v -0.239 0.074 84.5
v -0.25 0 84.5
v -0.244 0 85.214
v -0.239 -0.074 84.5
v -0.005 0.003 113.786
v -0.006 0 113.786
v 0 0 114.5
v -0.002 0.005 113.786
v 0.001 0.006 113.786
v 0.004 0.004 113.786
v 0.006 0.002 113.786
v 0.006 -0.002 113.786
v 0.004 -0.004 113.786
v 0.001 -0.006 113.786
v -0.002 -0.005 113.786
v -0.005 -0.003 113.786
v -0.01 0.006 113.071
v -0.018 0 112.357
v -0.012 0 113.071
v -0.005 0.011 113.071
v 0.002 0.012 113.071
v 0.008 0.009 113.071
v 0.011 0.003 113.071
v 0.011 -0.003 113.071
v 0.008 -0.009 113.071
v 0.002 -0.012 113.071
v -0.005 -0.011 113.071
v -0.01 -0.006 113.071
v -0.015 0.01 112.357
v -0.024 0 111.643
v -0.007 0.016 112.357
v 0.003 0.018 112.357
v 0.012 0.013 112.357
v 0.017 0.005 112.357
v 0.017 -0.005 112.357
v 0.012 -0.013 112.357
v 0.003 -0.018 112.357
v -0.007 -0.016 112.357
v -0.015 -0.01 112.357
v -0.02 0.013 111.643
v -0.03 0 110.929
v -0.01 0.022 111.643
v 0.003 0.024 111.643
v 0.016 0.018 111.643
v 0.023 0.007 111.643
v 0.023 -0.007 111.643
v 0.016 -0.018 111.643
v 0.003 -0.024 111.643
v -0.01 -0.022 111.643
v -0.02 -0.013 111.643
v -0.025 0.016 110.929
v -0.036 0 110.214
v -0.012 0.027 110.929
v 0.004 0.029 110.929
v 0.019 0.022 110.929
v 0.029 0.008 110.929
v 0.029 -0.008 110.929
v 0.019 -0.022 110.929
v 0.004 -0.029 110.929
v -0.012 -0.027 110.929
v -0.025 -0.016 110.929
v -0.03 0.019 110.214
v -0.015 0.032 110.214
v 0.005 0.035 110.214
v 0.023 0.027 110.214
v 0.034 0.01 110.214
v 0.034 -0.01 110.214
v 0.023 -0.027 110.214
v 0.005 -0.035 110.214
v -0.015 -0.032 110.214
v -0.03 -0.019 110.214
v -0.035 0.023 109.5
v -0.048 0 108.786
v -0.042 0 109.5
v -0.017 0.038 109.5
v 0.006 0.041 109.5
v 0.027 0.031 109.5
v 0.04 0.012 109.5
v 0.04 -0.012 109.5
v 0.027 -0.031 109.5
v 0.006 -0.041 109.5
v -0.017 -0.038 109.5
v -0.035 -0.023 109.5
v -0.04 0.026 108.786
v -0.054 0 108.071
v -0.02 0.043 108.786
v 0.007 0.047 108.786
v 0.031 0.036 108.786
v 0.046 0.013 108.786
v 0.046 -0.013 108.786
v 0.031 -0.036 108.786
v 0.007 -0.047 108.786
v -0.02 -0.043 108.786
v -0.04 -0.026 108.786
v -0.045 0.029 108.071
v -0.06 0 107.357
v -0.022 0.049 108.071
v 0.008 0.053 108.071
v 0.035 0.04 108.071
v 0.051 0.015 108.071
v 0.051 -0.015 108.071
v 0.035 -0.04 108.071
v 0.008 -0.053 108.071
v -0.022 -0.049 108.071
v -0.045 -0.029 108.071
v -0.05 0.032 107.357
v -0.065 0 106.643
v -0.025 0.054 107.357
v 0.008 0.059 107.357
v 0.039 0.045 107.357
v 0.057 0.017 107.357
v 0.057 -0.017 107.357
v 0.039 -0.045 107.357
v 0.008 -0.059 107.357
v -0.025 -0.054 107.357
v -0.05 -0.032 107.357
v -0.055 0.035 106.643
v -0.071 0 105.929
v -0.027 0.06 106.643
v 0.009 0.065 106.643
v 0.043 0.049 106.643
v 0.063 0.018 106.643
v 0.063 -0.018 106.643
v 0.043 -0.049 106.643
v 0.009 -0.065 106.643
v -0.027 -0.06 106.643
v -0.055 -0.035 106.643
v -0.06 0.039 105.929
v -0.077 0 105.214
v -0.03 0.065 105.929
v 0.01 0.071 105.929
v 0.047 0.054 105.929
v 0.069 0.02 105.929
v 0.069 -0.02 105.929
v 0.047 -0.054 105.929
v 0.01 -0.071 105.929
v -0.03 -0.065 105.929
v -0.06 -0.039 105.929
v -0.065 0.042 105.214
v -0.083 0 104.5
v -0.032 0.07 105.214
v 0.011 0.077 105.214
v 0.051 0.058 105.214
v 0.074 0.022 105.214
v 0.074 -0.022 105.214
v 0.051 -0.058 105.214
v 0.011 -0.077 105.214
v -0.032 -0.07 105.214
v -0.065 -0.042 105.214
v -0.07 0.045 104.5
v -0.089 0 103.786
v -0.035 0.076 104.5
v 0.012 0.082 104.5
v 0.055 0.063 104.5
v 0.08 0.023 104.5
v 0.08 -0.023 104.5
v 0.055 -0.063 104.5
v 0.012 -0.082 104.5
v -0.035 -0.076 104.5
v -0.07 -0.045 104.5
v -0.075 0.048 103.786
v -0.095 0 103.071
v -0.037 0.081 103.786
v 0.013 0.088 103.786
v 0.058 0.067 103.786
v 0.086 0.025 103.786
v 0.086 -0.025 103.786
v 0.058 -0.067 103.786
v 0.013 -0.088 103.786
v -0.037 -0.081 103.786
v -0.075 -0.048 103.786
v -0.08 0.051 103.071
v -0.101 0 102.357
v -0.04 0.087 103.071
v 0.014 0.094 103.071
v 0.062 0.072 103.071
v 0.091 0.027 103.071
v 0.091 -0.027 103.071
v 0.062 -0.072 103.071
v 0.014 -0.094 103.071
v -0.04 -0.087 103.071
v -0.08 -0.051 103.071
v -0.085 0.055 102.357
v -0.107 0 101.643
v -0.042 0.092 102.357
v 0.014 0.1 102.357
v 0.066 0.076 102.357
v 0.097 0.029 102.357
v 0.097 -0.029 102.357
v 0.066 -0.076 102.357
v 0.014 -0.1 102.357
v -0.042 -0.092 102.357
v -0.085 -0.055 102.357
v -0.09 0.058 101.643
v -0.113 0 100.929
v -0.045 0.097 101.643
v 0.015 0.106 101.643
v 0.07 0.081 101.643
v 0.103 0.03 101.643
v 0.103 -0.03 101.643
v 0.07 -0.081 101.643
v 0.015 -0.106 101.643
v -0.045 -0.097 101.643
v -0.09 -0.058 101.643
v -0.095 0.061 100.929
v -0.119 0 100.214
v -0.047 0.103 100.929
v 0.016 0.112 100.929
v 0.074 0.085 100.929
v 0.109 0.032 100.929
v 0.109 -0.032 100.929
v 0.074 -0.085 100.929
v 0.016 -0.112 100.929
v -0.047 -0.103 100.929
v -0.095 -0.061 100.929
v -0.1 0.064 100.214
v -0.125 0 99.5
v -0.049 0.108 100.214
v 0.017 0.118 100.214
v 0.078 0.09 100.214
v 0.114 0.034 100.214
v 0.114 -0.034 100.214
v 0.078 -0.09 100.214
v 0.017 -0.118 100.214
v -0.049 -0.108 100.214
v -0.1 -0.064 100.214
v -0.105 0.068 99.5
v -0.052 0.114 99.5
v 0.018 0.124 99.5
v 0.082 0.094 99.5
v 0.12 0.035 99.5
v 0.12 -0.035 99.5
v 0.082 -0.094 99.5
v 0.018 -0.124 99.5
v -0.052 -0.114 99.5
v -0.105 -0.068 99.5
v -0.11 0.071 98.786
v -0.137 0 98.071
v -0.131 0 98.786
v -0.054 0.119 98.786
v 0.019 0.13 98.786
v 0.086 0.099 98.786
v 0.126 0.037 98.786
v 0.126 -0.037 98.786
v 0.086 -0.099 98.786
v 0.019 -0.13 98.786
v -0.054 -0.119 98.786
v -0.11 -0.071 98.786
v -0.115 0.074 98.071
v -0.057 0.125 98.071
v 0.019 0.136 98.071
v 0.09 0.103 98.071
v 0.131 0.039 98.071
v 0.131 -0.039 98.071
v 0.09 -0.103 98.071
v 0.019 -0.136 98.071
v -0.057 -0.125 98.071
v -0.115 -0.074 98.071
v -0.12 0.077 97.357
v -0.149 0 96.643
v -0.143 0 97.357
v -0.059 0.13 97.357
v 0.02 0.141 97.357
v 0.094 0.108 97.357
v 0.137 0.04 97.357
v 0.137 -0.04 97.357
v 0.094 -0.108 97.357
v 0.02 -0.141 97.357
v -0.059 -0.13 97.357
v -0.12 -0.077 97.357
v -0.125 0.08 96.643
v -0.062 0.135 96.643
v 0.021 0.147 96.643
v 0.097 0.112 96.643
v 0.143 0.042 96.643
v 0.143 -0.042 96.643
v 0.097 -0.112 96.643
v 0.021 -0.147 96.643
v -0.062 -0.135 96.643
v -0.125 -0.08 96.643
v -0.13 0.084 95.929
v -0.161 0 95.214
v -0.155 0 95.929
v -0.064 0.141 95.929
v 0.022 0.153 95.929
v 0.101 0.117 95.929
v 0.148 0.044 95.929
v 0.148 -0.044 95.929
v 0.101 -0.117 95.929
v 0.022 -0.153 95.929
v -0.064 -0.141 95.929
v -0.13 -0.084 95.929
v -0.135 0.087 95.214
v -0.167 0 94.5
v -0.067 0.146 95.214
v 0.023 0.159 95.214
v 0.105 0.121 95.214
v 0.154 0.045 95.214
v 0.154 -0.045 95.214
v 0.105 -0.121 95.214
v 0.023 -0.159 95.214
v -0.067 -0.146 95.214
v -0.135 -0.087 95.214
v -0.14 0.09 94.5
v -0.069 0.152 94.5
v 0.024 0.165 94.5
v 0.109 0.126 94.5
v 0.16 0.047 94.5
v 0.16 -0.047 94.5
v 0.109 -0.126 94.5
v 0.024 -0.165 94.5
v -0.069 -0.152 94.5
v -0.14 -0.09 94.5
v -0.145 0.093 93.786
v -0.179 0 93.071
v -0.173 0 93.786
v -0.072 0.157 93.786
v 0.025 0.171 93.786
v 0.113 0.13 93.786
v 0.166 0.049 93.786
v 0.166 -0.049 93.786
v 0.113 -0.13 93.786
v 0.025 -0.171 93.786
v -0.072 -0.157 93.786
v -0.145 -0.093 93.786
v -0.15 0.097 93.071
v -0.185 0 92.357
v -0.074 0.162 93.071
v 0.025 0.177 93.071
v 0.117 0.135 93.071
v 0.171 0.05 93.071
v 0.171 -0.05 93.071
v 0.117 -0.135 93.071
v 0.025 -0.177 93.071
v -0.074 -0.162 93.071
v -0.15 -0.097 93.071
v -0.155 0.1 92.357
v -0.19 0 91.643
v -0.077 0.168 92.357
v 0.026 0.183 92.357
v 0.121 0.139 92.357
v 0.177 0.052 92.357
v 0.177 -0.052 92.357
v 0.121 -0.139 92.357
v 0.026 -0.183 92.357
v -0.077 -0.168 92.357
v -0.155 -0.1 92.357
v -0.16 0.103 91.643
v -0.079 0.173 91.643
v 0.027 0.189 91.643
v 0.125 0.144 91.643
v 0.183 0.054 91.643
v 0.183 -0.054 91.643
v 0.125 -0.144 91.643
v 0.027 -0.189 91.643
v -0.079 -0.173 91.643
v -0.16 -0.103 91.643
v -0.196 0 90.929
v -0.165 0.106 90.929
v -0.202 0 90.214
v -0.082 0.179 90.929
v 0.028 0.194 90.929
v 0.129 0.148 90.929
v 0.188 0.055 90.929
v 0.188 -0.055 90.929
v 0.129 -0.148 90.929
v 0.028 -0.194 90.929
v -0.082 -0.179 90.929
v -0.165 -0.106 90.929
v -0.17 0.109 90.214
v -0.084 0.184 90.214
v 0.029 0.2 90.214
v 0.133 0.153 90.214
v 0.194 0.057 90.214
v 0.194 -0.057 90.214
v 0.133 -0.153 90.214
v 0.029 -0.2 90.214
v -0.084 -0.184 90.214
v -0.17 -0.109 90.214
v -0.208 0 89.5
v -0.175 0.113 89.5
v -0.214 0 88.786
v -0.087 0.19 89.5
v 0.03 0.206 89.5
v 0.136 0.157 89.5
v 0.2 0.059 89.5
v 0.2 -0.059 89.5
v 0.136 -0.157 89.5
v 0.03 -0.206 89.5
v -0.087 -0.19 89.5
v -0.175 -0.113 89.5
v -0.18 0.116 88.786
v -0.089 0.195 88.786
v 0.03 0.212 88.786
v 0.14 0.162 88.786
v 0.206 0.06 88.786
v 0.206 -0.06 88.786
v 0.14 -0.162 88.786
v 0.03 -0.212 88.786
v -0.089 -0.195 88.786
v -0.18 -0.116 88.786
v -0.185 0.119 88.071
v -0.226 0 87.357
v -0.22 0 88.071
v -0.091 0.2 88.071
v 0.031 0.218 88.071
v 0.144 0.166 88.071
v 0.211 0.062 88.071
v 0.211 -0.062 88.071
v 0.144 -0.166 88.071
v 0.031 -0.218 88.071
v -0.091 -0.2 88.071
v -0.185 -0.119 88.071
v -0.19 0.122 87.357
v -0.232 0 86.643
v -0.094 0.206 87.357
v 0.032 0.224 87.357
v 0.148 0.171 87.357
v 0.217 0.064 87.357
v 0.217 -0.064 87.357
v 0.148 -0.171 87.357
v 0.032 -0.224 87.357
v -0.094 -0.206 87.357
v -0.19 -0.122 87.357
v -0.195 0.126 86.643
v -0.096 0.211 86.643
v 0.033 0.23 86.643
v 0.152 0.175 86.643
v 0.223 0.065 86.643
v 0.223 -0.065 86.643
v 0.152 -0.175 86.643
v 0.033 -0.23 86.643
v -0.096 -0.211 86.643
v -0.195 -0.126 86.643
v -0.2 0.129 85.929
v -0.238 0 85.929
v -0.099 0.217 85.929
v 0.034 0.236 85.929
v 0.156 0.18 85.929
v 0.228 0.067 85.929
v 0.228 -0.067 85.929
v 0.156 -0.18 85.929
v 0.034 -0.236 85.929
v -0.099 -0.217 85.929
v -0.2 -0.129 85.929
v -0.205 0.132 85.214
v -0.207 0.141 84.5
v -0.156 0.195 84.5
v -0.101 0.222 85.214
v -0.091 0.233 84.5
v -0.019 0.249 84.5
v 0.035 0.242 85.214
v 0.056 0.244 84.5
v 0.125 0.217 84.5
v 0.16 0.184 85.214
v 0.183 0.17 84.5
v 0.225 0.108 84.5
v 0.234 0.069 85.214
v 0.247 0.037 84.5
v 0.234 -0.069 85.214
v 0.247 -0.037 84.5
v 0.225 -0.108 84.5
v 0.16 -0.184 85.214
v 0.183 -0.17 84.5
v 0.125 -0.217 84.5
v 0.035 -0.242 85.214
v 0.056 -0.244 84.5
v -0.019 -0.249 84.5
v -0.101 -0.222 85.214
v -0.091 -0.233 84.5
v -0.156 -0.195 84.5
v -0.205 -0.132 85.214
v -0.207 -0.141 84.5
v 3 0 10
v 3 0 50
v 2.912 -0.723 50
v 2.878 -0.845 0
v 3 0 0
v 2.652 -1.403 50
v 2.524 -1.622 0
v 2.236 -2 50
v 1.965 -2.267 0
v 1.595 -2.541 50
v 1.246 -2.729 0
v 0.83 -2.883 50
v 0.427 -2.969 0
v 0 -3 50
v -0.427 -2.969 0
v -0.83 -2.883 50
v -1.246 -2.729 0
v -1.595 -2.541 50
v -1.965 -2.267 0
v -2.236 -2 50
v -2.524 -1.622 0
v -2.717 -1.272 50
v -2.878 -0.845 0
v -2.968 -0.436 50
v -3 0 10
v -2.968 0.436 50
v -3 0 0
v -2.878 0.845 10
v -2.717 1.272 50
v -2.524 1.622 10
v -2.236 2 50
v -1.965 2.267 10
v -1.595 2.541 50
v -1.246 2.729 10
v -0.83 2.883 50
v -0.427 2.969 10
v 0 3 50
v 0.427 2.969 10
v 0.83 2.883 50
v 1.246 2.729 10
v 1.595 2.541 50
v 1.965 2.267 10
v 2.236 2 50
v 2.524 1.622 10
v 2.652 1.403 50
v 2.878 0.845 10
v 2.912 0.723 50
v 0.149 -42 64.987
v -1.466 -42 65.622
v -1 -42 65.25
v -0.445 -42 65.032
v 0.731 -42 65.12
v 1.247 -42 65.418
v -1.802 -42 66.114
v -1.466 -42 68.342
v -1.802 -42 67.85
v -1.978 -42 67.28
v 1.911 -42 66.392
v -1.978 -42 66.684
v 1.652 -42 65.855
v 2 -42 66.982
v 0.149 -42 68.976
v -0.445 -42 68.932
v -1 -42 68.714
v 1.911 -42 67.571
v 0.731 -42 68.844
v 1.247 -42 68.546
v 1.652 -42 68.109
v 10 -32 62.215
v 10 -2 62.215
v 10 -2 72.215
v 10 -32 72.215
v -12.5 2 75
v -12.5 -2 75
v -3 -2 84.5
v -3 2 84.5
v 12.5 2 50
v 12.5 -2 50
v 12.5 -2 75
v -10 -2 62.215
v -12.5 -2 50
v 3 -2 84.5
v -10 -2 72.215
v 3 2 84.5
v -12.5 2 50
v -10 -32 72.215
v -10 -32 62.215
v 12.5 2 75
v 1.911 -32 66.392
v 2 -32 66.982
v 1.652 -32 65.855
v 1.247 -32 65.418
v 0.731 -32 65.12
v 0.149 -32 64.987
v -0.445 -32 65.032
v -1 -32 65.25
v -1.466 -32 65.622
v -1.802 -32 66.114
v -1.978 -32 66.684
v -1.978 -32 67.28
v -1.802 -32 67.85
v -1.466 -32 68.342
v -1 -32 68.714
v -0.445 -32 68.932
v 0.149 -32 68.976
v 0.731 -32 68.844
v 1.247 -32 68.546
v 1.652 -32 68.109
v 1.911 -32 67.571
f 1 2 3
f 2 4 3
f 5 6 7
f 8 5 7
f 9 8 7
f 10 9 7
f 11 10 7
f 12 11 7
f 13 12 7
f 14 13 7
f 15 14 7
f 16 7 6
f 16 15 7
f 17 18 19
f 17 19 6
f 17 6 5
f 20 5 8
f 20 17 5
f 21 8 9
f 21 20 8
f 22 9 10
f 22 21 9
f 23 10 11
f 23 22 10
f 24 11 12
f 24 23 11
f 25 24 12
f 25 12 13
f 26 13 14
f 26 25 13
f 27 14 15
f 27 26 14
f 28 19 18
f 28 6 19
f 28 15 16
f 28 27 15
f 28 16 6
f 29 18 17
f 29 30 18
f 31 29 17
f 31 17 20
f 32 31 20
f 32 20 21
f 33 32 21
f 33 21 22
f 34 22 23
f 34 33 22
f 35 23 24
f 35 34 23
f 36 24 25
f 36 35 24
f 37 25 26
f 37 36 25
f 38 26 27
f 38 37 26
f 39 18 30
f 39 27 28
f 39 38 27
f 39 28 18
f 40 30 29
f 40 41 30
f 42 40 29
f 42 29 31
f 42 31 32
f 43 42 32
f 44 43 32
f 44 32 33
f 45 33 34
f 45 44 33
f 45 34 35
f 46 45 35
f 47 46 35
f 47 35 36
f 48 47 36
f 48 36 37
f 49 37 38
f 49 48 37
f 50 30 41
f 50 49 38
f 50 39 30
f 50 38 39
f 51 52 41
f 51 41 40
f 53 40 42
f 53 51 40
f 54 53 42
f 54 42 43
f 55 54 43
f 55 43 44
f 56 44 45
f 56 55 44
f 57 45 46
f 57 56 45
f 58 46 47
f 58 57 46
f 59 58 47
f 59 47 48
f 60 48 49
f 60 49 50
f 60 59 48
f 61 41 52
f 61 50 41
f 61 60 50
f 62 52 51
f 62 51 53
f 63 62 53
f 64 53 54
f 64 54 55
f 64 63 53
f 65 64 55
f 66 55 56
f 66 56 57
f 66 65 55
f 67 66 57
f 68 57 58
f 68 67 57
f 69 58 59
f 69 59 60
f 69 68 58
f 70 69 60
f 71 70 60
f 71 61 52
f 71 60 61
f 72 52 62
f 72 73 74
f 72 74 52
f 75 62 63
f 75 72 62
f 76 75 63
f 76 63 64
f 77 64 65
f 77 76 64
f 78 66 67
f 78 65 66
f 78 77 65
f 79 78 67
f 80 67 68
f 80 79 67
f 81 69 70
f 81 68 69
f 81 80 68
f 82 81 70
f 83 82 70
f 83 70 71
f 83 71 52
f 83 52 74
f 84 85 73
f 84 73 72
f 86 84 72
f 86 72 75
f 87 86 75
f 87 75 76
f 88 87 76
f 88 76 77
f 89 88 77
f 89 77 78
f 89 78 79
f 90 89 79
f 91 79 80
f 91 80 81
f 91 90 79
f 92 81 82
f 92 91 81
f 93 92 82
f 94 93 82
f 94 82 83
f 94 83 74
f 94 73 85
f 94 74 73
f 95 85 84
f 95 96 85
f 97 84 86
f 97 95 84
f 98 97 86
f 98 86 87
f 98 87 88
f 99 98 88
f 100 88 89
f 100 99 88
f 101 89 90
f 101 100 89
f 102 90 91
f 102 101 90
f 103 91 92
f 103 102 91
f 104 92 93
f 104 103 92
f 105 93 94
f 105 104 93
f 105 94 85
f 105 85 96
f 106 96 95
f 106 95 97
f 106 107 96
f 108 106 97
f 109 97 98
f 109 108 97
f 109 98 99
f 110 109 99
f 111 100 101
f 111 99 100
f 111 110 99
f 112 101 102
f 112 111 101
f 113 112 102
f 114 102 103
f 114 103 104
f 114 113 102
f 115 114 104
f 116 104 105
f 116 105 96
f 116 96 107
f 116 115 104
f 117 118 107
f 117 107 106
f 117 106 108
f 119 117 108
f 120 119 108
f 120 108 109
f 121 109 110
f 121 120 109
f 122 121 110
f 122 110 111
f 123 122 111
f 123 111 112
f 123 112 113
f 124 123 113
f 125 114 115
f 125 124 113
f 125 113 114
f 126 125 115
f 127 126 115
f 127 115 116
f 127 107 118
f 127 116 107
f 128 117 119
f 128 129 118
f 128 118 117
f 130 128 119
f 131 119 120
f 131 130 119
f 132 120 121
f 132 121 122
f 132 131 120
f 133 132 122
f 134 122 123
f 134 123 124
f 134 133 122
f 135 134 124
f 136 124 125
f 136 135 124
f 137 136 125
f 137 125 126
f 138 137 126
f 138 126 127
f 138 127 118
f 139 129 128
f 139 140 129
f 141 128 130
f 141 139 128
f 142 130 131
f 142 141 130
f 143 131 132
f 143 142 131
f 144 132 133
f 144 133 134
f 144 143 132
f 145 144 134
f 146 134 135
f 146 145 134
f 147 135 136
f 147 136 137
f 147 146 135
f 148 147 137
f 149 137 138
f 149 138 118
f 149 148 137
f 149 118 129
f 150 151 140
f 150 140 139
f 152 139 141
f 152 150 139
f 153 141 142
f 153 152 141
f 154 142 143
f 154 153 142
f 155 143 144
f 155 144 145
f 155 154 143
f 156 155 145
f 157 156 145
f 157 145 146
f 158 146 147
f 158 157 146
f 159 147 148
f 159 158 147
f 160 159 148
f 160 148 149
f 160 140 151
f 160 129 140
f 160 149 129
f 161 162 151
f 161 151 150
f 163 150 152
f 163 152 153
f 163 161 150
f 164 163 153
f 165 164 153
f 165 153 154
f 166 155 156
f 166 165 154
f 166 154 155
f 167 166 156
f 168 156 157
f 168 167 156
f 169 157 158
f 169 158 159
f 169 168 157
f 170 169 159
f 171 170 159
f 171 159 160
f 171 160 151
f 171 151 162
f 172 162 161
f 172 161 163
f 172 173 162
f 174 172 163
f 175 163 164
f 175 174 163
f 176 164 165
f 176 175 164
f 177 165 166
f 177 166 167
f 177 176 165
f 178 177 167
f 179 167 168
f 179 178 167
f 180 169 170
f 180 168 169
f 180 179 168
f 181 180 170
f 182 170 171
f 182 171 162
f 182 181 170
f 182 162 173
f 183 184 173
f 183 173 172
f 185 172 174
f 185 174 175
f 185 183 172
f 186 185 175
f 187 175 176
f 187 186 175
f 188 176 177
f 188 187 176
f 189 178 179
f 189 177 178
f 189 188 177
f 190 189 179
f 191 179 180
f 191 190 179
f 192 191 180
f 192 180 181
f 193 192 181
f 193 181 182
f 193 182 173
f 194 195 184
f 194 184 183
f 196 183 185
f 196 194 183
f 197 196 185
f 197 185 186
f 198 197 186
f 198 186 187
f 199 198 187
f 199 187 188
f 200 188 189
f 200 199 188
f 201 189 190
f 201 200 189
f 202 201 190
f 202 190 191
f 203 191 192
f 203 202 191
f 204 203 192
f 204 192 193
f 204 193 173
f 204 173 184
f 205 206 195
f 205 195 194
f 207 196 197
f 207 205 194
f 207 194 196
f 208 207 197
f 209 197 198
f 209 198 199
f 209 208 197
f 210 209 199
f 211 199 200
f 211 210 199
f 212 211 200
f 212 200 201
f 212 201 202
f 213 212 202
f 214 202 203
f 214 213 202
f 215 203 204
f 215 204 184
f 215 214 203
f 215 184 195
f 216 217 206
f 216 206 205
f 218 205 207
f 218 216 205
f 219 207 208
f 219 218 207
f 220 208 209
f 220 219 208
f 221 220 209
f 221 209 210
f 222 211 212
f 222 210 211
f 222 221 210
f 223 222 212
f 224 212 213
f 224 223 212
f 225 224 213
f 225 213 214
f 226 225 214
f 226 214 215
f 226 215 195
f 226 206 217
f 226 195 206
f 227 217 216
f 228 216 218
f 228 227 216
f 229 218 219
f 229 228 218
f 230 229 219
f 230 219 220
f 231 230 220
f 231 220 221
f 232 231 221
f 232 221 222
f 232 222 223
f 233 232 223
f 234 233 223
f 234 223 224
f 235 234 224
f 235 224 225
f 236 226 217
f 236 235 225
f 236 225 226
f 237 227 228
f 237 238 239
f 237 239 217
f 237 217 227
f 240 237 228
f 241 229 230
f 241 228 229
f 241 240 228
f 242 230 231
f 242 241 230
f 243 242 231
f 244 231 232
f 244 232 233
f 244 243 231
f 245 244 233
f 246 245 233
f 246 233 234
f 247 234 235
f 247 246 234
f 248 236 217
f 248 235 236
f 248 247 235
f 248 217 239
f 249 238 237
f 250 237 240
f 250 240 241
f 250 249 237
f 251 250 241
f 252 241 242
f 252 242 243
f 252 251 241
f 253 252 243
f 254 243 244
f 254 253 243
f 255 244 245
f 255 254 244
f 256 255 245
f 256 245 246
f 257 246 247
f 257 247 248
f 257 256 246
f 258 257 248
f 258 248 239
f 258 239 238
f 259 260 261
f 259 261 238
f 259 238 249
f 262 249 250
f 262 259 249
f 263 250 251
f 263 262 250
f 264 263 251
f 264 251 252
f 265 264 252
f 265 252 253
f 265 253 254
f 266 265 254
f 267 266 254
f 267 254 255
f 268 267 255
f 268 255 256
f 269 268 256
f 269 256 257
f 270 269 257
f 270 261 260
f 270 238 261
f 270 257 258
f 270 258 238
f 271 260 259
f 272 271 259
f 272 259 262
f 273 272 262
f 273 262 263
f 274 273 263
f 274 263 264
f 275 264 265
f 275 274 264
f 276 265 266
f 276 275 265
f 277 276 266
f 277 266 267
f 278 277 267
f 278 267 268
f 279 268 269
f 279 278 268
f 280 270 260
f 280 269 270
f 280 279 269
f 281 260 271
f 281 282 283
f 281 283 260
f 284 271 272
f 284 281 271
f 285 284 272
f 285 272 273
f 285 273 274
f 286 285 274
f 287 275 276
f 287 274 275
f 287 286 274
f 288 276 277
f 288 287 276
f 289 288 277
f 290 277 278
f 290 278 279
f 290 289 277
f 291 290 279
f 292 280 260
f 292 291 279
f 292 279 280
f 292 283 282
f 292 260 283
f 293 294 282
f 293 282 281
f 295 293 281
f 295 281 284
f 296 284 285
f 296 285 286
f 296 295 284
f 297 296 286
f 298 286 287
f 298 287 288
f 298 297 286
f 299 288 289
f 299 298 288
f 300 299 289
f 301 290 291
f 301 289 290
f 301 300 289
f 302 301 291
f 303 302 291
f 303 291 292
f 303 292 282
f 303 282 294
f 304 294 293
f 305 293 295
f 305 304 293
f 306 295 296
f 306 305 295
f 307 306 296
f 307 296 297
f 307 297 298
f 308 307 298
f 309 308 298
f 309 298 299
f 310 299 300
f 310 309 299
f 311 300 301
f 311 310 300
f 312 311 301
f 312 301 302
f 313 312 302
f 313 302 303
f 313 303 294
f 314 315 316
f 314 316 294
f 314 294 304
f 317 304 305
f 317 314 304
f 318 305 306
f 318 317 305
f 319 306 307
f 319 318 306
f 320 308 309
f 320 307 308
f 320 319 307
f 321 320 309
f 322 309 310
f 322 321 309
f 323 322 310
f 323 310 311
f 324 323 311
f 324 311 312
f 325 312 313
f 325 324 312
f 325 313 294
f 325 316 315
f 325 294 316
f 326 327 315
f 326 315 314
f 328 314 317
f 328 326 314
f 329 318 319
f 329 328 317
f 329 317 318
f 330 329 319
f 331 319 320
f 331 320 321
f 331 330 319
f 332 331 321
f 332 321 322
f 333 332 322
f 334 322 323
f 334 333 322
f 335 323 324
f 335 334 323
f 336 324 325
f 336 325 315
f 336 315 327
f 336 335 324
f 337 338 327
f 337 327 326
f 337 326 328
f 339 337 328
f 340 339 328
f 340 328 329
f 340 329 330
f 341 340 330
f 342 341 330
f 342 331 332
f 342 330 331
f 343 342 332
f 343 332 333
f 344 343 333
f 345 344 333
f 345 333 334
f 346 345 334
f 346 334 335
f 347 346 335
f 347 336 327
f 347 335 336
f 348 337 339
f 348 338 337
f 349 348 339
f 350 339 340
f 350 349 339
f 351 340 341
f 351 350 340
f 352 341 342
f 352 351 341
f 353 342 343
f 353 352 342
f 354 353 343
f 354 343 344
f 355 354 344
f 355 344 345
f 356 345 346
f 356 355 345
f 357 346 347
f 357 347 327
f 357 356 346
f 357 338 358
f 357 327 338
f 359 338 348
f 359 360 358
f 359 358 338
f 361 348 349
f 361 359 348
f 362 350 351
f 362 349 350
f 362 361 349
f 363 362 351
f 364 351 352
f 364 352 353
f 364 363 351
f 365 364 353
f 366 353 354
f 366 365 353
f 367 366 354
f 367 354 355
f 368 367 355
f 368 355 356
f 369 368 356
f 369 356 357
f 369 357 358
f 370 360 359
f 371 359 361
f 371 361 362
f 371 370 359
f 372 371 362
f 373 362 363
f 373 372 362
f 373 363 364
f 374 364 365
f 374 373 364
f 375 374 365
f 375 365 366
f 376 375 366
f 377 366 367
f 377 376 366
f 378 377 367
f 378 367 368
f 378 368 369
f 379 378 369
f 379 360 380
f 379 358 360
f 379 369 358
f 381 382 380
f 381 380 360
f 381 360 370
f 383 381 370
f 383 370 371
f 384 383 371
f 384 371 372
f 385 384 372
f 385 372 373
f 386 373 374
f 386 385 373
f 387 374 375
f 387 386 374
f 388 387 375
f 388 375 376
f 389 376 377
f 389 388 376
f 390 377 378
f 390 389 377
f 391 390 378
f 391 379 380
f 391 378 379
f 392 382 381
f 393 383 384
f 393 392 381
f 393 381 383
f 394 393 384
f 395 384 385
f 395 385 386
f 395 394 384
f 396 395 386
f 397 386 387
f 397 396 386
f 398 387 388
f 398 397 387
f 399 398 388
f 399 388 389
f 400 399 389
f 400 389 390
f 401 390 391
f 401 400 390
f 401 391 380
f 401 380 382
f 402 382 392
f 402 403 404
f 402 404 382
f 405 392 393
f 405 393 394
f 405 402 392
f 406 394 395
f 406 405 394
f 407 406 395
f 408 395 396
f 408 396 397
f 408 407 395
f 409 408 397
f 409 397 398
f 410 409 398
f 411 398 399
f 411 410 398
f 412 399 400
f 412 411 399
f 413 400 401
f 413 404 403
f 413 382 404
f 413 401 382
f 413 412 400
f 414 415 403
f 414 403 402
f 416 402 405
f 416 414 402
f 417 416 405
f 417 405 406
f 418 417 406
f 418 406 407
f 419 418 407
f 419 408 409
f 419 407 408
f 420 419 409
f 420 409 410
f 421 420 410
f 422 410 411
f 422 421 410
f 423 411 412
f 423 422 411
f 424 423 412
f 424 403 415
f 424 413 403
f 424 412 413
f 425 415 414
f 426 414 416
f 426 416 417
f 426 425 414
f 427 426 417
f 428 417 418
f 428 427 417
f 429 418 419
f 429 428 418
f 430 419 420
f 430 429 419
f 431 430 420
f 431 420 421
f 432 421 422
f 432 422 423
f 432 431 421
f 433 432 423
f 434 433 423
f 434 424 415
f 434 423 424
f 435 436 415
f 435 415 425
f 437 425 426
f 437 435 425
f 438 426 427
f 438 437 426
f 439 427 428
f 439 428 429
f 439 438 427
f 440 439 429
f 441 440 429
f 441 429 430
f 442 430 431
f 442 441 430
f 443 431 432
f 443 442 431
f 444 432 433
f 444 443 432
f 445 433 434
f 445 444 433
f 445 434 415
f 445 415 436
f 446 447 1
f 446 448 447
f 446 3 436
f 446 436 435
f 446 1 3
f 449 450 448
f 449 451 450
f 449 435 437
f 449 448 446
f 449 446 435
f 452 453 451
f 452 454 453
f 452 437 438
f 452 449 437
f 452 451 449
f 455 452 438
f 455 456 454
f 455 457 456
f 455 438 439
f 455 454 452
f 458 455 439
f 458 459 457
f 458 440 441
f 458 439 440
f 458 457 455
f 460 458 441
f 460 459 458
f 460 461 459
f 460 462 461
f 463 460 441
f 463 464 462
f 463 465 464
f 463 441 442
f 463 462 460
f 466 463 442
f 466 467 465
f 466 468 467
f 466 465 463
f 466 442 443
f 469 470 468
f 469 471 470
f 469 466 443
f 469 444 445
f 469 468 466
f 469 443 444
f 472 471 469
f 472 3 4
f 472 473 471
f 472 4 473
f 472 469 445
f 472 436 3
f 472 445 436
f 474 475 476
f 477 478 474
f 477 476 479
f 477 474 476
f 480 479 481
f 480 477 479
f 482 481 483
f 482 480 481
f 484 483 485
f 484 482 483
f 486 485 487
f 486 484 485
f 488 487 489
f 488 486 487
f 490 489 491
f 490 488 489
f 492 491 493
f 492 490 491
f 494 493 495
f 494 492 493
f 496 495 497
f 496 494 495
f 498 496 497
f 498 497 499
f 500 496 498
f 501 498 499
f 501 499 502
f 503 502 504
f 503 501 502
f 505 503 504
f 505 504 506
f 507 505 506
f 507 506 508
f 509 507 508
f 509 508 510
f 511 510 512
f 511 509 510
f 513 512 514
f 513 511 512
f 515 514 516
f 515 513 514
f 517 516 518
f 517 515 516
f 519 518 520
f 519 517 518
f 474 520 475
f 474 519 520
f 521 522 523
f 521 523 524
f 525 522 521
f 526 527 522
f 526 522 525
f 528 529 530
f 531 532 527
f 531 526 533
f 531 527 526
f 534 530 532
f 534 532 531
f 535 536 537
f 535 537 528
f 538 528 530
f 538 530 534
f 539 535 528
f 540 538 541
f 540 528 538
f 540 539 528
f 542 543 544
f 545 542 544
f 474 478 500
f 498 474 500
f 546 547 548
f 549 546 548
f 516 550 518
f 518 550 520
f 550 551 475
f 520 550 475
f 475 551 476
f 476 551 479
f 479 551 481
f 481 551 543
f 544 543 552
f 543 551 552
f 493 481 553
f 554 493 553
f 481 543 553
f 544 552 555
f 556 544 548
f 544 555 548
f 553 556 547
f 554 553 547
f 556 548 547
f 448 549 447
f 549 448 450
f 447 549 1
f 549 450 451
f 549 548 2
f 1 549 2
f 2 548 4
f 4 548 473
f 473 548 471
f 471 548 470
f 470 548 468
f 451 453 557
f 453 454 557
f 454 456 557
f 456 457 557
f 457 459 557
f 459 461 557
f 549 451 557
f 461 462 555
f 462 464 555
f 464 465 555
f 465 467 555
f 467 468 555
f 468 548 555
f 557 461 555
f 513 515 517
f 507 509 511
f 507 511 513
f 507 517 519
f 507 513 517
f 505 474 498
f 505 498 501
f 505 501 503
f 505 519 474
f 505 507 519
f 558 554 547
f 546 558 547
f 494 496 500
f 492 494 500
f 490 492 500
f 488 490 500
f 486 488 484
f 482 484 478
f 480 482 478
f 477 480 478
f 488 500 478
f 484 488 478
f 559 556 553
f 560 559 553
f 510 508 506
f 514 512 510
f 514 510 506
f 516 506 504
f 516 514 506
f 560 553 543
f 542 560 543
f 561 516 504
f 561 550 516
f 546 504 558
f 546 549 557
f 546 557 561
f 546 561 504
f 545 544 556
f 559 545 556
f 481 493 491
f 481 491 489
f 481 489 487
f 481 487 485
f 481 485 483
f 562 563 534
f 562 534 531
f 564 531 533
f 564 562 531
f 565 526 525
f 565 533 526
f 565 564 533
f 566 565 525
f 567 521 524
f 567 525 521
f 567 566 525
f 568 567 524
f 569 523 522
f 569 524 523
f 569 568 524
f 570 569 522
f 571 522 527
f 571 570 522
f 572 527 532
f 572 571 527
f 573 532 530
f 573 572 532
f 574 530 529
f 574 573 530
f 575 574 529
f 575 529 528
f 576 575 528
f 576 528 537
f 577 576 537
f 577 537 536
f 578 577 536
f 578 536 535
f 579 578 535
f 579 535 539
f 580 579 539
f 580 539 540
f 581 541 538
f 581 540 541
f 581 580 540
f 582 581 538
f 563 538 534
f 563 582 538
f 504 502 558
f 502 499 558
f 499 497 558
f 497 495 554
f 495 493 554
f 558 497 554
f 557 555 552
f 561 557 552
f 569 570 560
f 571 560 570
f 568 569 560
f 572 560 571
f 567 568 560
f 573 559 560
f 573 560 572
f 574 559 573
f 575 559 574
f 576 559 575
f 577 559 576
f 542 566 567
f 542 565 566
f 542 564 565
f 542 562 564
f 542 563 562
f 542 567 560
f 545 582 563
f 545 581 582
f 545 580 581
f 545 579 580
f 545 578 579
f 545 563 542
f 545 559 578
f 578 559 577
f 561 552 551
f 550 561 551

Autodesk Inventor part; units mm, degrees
ref_plane "YZ Plane" through (0, 0, 0) normal (1, 0, 0) x (0, 1, 0)
ref_plane "XZ Plane" through (0, 0, 0) normal (0, 1, 0) x (-1, 0, 0)
ref_plane "XY Plane" through (0, 0, 0) normal (0, 0, 1) x (1, 0, 0)
sketch "Sketch1" plane through (0, 0, 0) normal (0, 0, 1) x (1, 0, 0)
  circle A0 centre (0, 0) radius 3
  dimension "d0" = 6
extrude "Extrusion1" add sketch "Sketch1" along normal blind 50
sketch "Sketch2" plane through (0, 0, 0) normal (0, 1, 0) x (-1, 0, 0)
  line L0 (-12.5, 75) -> (-12.5, 50)
  line L1 (-12.5, 50) -> (12.5, 50)
  line L2 (12.5, 50) -> (12.5, 75)
  line L3 (12.5, 75) -> (-12.5, 75)
  line L4 (-12.5, 75) -> (12.5, 50) construction
  line L5 (-12.5, 50) -> (12.5, 75) construction
  line L6 (3, 50) -> (-3, 50) projected
  line L7 (3, 50) -> (-3, 50) projected
  line L8 (3, 0) -> (-3, 0) projected
  line L9 (3, 0) -> (-3, 0) projected
  line L10 (-3, 0) -> (3, 50)
  line L11 (3, 0) -> (-3, 50)
  line L12 (12.5, 75) -> (3, 84.5)
  line L13 (3, 84.5) -> (3, 84.5)
  line L14 (3, 84.5) -> (-3, 84.5)
  line L15 (-3, 84.5) -> (-3, 84.5)
  line L16 (-3, 84.5) -> (-12.5, 75)
  line L17 (0.25, 84.5) -> (0, 114.5)
  line L18 (0, 114.5) -> (-0.25, 84.5)
  line L19 (0, 114.5) -> (0, 84.5)
  point P0 (0, 0)
  point P1 (0, 62.5)
  point P2 (0, 50)
  point P3 (0, 25)
  point P4 (0, 62.5)
  dimension "d3" = 25
  dimension "d4" = 25
  dimension "d5" = 6
  dimension "d6" = 0
  dimension "d11" = 30
  dimension "d14" = 0.5
  dimension "d15" = 0.25
extrude "Extrusion2" add sketch "Sketch2" along normal mid plane 4 contours L3 L2 L1 L0 | L16 L14 L12 L3
sketch "Sketch3" plane through (0, -2, 0) normal (0, -1, 0) x (1, 0, 0)
  line L0 (-10, 72.2148) -> (-10, 62.2148)
  line L1 (-10, 62.2148) -> (10, 62.2148)
  line L2 (10, 62.2148) -> (10, 72.2148)
  line L3 (10, 72.2148) -> (-10, 72.2148)
  line L4 (-10, 72.2148) -> (10, 62.2148) construction
  line L5 (-10, 62.2148) -> (10, 72.2148) construction
  point P0 (0, 0)
  point P1 (0, 67.2148)
  dimension "d18" = 10
  dimension "d24" = 20
extrude "Extrusion3" add sketch "Sketch3" along normal blind 30
revolve "Revolution1" add sketch "Sketch2" angle 360 about axis through (0, 0, 114.5) along (0, 0, -1) contours L14 L19 L17
sketch "Sketch5" plane through (0, 0, 0) normal (0, 0, -1) x (-1, 0, 0)
  arc A0 (-2.2361, 2) -> (-2.2361, -2) centre (0, 0) ccw projected
  line L0 (-3, 0) -> (3.9396, 0)
  line L1 (3.9396, 0) -> (3.9396, 5.4672)
  line L2 (3.9396, 5.4672) -> (-3, 5.4672)
  line L3 (-3, 5.4672) -> (-3, 0)
extrude "Extrusion4" cut sketch "Sketch5" against normal blind 10
sketch "Sketch6" plane through (0, -32, 0) normal (0, -1, 0) x (1, 0, 0)
  circle A0 centre (0, 66.9819) radius 2
  point P0 (0, 0)
  dimension "d25" = 4
extrude "Extrusion5" add sketch "Sketch6" along normal blind 10
equation "\"d15\" = 0.5 * d14"
properties part number "electrode"
